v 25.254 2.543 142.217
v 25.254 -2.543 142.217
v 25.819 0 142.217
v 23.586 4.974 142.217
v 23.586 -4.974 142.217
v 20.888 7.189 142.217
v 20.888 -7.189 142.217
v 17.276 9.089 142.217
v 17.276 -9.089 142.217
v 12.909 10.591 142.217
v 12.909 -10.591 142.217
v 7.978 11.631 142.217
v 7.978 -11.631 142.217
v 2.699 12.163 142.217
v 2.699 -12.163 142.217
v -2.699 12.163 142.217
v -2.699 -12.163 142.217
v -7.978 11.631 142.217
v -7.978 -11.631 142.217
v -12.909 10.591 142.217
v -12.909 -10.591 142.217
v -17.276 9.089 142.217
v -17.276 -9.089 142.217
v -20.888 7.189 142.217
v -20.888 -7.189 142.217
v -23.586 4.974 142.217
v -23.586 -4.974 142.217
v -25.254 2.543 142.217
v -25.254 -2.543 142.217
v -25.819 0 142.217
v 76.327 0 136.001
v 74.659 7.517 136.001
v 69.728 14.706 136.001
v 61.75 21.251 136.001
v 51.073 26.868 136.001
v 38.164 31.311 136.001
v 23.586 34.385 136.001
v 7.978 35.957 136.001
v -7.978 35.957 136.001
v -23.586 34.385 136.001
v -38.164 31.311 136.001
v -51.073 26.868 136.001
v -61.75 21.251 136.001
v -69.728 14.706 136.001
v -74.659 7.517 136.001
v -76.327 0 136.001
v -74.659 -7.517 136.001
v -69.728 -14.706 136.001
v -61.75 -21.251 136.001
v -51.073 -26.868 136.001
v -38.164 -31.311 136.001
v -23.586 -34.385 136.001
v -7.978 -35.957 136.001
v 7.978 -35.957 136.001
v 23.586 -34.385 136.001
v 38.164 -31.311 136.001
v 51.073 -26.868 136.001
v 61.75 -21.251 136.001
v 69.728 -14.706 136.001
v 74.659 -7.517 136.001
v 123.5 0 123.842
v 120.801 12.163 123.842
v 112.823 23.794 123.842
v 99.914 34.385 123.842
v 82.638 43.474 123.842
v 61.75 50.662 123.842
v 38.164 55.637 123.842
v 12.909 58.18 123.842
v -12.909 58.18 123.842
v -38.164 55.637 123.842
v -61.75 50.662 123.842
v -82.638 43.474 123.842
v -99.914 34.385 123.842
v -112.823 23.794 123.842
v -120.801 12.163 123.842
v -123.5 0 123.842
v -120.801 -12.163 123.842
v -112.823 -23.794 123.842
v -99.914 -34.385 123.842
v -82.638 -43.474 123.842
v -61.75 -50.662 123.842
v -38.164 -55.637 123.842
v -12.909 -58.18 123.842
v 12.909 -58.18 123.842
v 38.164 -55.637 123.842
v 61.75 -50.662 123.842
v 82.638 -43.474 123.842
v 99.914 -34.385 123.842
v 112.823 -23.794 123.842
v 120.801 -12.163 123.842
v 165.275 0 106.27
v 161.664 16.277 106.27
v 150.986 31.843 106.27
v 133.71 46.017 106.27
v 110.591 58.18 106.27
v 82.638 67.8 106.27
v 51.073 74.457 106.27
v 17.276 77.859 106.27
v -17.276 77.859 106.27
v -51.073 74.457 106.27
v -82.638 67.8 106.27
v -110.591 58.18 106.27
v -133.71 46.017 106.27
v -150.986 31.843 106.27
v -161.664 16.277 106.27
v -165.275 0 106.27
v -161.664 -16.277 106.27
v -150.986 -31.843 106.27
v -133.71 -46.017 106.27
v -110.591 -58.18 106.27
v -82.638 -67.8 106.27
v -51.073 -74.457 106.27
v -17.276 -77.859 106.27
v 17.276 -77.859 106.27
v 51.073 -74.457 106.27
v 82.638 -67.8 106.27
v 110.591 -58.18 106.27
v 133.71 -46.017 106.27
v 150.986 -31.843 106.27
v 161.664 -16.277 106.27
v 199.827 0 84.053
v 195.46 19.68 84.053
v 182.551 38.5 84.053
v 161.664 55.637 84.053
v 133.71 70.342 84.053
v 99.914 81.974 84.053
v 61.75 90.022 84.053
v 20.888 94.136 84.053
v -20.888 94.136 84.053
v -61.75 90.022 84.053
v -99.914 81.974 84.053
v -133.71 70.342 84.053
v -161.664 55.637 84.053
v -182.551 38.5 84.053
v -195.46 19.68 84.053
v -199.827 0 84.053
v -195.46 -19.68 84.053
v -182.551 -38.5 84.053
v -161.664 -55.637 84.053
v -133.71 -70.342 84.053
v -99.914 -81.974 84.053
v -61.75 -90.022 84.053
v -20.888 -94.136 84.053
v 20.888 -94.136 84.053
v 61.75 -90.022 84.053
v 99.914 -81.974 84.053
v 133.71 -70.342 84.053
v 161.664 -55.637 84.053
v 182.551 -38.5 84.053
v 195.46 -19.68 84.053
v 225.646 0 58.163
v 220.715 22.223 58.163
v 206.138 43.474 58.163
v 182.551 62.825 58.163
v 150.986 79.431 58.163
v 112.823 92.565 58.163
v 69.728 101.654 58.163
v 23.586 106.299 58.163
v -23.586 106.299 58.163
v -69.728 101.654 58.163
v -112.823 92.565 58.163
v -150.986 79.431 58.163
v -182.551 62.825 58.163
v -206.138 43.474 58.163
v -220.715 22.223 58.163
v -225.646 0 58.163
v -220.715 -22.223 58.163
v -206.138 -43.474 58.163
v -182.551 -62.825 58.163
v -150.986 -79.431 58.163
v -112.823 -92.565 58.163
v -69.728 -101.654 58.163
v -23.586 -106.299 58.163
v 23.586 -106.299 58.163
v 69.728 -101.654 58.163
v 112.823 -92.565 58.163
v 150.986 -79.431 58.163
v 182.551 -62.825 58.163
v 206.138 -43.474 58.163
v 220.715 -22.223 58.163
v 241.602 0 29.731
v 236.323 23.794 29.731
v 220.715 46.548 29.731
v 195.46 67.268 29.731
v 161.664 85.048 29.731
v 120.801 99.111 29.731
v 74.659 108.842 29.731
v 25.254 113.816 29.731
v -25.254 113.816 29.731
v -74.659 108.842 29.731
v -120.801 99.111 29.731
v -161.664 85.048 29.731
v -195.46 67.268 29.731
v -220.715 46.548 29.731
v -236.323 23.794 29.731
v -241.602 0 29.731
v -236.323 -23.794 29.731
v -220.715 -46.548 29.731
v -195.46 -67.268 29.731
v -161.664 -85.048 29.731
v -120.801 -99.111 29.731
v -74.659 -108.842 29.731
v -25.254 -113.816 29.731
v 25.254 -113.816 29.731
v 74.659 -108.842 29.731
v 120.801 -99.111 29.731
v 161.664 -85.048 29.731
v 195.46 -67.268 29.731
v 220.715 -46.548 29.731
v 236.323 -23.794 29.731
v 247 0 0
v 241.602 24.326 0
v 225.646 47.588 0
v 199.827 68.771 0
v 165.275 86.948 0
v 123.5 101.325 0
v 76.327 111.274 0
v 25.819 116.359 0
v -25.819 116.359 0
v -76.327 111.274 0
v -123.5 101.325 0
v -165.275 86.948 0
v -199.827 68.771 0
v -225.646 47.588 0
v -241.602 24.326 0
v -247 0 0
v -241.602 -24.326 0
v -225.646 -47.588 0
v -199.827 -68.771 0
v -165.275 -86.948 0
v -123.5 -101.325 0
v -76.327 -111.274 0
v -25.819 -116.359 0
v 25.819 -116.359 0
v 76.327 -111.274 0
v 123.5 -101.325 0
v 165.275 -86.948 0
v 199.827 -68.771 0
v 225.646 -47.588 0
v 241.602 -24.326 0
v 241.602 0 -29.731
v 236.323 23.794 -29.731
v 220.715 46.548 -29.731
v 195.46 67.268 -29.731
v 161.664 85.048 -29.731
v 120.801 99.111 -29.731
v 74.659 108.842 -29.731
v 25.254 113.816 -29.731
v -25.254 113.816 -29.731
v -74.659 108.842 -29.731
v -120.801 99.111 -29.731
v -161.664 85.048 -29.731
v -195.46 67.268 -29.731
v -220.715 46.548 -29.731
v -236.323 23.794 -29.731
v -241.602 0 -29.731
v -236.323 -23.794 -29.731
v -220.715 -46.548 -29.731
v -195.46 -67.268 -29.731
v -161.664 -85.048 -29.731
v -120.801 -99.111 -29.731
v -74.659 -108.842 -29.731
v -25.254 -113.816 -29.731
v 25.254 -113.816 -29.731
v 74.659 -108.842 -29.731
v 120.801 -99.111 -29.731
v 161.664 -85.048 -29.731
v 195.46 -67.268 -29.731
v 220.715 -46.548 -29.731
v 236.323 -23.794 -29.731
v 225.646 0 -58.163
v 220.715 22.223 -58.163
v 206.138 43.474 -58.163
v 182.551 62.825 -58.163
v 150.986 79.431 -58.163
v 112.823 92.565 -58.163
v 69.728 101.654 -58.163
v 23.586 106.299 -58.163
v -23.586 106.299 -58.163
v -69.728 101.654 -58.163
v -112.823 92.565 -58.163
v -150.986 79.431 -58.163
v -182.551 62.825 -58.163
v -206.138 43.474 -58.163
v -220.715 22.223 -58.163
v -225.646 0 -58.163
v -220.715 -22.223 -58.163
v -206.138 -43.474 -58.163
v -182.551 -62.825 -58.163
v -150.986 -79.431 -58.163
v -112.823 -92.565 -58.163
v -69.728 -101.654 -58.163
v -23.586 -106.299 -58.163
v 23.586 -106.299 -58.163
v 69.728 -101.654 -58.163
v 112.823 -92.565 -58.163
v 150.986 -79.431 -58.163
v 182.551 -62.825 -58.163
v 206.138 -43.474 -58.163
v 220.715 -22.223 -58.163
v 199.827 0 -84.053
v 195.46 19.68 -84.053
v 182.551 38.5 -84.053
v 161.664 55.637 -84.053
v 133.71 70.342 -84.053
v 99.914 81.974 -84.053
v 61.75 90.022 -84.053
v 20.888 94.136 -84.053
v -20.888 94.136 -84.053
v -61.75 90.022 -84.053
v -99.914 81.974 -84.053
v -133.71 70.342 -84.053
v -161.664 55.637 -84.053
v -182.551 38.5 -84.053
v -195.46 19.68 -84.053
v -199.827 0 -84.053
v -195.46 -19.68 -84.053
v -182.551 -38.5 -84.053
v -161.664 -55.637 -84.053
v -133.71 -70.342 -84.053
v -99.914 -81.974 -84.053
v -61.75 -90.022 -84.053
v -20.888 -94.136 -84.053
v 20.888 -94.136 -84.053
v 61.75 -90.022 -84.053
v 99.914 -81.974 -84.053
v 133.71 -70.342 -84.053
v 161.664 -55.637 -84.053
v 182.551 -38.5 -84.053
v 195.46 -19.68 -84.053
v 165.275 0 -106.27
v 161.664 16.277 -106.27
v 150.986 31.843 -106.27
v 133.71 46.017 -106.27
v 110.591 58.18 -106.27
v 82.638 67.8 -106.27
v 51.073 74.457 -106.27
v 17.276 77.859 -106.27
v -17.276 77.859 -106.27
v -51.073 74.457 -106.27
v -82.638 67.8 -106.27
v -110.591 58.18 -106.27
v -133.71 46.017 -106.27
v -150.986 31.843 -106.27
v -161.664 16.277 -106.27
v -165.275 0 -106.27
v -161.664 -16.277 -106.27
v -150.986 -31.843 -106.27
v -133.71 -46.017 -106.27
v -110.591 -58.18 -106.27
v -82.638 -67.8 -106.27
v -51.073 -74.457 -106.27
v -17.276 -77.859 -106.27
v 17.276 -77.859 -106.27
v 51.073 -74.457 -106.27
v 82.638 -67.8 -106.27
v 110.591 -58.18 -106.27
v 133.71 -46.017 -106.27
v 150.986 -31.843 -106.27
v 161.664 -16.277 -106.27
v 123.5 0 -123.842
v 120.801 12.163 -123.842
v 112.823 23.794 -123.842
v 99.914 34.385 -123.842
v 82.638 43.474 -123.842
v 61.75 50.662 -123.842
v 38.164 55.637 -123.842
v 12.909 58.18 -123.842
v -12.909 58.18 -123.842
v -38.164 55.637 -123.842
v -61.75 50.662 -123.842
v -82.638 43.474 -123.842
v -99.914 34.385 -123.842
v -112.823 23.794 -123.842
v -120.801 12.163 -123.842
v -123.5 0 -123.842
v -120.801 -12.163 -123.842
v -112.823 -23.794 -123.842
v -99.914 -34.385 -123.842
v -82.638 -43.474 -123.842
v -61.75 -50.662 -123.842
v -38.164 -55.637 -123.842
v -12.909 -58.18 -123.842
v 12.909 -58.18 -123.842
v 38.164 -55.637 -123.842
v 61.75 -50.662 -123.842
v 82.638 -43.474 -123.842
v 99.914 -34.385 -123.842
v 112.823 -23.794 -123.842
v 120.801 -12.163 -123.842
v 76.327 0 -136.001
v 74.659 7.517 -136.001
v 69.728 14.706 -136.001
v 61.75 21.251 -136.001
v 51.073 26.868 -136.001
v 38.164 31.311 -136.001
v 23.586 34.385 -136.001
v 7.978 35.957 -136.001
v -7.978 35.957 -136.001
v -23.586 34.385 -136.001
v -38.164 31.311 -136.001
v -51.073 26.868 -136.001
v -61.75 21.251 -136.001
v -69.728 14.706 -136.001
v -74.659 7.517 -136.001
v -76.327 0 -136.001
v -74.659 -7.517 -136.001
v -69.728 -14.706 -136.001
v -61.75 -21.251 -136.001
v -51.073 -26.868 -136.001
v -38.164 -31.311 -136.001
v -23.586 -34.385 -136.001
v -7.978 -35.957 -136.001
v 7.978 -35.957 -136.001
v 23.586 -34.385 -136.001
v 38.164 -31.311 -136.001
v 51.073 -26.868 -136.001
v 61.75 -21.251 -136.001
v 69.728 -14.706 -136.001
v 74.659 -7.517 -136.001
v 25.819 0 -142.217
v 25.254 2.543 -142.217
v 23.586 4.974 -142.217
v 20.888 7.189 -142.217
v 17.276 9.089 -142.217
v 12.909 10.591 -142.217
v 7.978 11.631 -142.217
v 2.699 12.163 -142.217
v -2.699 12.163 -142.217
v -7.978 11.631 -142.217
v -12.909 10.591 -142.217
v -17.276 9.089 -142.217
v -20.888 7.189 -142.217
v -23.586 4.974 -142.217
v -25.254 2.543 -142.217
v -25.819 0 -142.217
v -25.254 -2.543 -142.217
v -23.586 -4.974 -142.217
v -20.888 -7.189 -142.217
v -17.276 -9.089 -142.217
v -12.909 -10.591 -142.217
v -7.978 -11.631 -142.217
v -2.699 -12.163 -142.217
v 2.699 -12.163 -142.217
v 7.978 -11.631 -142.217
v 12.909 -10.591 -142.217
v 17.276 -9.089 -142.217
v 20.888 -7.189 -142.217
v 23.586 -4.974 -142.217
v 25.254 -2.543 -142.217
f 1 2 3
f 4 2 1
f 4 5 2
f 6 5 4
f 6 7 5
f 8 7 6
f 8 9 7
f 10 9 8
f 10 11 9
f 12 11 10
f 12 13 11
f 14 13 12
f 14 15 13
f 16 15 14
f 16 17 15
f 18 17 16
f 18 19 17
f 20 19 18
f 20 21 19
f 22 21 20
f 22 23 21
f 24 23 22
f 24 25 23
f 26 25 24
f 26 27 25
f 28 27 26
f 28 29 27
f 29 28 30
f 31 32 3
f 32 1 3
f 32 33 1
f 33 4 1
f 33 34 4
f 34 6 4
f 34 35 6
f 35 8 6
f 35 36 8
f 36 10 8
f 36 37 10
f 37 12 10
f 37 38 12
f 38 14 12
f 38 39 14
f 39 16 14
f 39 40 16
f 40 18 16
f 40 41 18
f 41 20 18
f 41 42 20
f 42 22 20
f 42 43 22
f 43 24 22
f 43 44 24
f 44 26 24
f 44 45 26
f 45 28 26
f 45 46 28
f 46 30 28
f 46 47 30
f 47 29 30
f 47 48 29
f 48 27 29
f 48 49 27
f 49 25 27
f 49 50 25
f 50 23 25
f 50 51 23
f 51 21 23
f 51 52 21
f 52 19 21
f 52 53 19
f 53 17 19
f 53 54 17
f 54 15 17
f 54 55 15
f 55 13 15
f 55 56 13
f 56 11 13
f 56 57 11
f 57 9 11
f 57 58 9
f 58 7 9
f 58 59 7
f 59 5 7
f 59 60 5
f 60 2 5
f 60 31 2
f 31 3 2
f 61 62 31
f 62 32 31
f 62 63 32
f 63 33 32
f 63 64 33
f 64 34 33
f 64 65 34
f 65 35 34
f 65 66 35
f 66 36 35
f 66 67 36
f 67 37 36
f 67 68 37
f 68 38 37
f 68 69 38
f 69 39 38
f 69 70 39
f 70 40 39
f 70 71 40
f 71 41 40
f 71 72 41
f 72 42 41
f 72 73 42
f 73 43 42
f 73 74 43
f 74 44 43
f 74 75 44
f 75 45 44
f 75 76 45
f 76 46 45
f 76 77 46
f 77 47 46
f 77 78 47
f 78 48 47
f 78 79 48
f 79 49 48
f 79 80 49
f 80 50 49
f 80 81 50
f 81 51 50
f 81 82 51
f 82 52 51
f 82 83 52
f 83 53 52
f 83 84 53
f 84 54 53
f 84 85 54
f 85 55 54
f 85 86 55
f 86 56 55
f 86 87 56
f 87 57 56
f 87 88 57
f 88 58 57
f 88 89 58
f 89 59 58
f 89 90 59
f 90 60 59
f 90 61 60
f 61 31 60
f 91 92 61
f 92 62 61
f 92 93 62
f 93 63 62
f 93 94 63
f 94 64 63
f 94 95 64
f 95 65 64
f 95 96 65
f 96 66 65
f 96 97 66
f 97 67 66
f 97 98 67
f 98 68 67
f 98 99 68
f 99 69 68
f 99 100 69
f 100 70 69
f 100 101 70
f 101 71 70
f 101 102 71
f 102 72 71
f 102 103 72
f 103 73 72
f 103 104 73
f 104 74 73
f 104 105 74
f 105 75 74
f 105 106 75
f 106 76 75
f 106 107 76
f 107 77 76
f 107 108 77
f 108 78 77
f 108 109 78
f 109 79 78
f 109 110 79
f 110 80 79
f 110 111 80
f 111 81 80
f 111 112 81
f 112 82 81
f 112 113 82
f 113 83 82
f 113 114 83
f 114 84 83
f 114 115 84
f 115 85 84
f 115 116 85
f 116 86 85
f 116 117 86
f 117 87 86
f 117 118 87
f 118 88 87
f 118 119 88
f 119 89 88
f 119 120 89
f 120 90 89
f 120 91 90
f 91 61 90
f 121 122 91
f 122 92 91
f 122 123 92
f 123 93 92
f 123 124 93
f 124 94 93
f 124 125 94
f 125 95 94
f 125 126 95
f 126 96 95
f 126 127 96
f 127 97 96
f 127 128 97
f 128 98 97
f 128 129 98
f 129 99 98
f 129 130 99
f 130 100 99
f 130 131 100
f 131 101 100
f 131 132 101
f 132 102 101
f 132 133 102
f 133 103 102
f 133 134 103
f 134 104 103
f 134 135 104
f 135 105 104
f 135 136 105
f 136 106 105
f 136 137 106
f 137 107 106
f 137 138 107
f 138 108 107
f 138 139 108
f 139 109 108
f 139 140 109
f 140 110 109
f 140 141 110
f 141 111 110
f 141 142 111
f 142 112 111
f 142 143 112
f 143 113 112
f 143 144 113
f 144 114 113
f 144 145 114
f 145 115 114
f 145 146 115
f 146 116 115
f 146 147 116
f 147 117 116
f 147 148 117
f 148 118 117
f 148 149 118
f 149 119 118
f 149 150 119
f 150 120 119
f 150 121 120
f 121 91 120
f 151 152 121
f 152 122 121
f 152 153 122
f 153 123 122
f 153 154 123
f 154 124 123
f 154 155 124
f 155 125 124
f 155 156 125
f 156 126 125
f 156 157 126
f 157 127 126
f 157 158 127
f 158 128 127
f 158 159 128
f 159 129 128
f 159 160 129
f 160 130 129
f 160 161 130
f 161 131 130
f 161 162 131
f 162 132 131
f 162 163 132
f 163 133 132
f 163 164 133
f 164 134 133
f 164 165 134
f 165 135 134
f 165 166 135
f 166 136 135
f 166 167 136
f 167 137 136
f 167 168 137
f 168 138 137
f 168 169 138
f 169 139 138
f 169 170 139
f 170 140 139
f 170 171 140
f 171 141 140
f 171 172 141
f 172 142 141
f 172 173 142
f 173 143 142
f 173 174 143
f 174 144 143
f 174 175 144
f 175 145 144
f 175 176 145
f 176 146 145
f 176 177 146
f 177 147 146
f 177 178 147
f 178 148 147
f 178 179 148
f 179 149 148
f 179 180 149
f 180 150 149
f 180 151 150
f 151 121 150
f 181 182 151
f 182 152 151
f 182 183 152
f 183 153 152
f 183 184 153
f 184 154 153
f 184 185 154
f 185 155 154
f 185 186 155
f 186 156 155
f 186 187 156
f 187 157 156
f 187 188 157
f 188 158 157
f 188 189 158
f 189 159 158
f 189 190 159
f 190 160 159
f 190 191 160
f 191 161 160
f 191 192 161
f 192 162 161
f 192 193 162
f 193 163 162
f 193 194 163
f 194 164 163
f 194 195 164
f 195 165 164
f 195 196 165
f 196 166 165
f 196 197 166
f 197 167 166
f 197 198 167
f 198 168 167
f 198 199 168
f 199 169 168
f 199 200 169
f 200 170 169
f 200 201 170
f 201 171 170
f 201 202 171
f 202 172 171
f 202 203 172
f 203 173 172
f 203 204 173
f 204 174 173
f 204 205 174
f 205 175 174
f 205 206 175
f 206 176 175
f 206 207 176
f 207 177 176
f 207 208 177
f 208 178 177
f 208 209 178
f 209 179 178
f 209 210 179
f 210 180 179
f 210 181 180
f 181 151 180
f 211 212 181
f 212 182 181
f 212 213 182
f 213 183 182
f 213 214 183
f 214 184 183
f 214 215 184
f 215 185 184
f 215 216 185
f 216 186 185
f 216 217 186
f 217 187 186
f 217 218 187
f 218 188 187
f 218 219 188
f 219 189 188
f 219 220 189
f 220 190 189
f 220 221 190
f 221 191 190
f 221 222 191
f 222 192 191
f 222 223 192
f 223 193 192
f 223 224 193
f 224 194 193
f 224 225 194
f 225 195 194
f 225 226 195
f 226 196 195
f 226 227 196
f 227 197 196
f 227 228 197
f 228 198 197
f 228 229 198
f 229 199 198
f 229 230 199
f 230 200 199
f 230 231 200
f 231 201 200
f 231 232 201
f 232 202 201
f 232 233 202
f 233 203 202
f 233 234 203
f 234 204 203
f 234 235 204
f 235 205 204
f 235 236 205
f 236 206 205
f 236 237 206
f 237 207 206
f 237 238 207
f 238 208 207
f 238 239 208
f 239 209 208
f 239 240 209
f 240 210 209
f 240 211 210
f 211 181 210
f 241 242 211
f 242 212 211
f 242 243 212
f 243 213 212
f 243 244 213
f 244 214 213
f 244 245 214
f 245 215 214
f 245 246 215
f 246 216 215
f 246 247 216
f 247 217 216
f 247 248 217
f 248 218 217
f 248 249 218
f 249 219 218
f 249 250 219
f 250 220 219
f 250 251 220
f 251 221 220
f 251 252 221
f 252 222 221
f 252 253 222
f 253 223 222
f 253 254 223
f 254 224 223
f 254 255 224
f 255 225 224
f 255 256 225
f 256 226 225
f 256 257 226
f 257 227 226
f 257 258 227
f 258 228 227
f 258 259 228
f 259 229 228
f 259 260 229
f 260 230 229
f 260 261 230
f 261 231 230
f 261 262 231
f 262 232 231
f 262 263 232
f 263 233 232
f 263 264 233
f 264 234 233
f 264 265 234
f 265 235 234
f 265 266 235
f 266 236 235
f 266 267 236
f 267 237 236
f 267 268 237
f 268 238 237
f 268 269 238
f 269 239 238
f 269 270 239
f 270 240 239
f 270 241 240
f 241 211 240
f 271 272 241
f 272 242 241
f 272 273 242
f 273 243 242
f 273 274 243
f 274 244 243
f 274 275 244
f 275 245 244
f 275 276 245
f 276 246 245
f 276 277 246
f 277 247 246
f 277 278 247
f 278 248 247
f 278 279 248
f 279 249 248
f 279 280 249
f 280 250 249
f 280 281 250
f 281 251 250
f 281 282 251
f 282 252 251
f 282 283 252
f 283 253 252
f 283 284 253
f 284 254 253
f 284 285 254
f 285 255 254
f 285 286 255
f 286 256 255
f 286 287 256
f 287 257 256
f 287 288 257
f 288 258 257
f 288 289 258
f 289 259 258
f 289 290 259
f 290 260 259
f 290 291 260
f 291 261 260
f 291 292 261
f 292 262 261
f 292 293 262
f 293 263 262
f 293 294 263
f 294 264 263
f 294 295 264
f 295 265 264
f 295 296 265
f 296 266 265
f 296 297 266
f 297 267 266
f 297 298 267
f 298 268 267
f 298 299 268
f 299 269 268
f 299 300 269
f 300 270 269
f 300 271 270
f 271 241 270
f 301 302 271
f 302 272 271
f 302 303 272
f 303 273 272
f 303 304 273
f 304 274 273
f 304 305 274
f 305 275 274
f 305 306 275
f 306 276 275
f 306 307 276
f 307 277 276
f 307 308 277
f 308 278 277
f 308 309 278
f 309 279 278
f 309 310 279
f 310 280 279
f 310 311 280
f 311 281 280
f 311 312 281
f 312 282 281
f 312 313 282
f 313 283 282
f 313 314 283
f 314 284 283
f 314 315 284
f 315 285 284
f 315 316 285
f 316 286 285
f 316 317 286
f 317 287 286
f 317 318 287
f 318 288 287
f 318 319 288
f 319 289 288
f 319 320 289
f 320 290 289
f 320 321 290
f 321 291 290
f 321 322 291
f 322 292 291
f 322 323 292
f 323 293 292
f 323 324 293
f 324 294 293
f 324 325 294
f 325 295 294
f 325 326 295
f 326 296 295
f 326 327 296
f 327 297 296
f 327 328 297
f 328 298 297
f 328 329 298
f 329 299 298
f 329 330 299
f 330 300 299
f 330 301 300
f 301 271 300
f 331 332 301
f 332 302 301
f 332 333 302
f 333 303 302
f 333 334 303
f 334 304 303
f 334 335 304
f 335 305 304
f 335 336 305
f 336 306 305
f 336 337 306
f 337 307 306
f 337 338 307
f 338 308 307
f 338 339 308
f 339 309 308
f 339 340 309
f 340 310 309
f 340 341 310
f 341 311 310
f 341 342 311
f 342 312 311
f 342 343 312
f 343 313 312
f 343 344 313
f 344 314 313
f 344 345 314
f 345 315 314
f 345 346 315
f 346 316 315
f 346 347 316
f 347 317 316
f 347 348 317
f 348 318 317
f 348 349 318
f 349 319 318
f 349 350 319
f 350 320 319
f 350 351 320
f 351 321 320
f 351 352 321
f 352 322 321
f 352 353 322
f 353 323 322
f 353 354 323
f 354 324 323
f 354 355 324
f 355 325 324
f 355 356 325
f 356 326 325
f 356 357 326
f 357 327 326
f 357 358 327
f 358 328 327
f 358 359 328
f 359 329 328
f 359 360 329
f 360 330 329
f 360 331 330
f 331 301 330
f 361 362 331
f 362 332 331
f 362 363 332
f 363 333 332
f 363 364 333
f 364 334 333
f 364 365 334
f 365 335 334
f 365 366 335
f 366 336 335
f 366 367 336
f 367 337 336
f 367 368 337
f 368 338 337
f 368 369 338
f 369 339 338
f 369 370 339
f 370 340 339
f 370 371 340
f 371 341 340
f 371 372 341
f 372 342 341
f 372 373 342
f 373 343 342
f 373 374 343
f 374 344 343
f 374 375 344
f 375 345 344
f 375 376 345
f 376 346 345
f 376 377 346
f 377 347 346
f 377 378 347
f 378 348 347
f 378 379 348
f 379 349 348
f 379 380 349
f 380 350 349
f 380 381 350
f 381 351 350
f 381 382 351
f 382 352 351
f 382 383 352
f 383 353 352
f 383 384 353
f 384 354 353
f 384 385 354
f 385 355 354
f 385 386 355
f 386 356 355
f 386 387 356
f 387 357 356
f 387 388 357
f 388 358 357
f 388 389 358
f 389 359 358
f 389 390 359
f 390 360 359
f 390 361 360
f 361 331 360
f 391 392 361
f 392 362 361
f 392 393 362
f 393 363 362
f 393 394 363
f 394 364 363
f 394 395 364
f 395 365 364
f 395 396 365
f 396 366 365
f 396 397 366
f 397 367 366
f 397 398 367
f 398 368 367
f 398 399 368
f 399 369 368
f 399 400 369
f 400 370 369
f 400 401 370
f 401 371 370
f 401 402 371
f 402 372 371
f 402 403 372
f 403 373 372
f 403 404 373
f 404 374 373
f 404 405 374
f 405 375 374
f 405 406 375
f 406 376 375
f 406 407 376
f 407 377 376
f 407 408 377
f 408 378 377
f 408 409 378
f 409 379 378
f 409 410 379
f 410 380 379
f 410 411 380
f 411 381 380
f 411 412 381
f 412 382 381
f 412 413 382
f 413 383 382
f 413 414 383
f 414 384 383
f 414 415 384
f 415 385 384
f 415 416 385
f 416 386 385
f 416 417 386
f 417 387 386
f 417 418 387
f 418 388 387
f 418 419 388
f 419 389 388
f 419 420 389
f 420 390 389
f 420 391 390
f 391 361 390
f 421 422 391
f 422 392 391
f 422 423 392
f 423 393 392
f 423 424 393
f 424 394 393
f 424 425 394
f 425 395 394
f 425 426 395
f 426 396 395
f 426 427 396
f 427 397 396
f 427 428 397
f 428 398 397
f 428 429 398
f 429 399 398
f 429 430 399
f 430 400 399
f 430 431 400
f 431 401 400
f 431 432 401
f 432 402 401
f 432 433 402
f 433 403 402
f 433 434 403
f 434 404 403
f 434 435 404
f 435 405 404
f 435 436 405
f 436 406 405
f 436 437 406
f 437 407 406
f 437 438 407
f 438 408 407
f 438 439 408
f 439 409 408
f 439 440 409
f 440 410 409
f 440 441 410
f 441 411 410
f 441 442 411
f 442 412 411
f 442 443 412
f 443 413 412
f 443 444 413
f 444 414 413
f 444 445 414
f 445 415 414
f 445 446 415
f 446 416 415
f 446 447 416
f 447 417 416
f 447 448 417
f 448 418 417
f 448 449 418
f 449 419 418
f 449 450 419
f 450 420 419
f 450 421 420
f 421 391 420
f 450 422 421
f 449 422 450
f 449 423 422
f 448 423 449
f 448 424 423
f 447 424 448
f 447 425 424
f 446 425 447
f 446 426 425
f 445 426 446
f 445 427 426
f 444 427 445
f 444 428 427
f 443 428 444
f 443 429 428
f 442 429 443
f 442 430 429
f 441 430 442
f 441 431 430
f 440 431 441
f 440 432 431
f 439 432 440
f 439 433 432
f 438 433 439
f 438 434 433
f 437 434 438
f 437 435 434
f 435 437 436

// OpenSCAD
// Generated by SolidPython 1.0.1 on 2020-07-29 00:46:54


scale(v = [19, 9, 11]) {
	sphere(r = 13);
}
/***********************************************
*********      SolidPython code:      **********
************************************************
 
# import packages: SolidPython
from solid import *
from solid.utils import *
from itertools import chain, combinations, permutations


class Resize:

    def __init__(self, scad_file):
        self.scad_file = scad_file
        #self.scad_file = import_scad(scad_file)
        # cone/cylinder param:
        self.r1 = 0
        self.r2 = 0
        self.h = 0
        # rectangular prism param:
        self.w = 0
        self.l = 0
        # ellipse param:
        self.r = 0

    # import OpenScad code (file name corresponds to shape)


    # classify shape + parameters
    def assign(self, param1, param2, param3):
        if self.scad_file == 'cone.scad':
            self.r1 = param1
            self.r2 = param2
            self.h = param3
        elif self.scad_file == 'cylinder.scad':
            self.r1 = param1
            self.r2 = param2
            self.h = param3
        elif self.scad_file == 'rectangularPrism.scad':
            self.h = param1
            self.l = param2
            self.w = param3
        else:
            self.r = param1
            self.h = param2

    # resize parameters
    def iterate(self):
        x = range(3, 20, 2)
        i = 1
        if self.scad_file == 'cone.scad':
            tempList = list(permutations(x, 2))
            for temp in tempList:
                param1 = temp[0]
                param2 = temp[1]
                filepath = 'produced_scad_files/' + 'cone' + str(param1) + '_' + str(param2) + '_' + '.scad'
                scad_render_to_file(cylinder(h=param1, r1=param2, r2=0), filepath)

        elif self.scad_file == 'cylinder.scad':
            tempList = list(permutations(x, 3))
            for temp in tempList:
                param1 = temp[0]
                param2 = temp[1]
                filepath = 'produced_scad_files/' + 'cylinder' + str(param1) + '_' + str(param2) + '_' + '.scad'
                scad_render_to_file(cylinder(h=param1, r1=param2, r2=param2), filepath)

        elif self.scad_file == 'rectangularPrism.scad':
            tempList = list(permutations(x, 3))
            for temp in tempList:
                param1 = temp[0]
                param2 = temp[1]
                param3 = temp[2]
                filepath = 'produced_scad_files/' + 'rectangularPrism' + str(param1) + '_' + str(param2) + '_' + str(
                    param3) + '.scad'
                scad_render_to_file(cube(size=(param1, param2, param3)), filepath)

        elif self.scad_file == 'ellipse.scad':
            tempList = list(permutations(x, 4))
            for temp in tempList:
                param1 = temp[0]
                param2 = temp[1]
                param3 = temp[2]
                param4 = temp[3]
                filepath = 'produced_scad_files/' + 'ellipse' + str(param1) + '_' + str(param2) + '_' + str(param3) + '_' + str(param4) + '.scad'
                scad_render_to_file(scale([param1, param2, param3])(sphere(r=param4)), filepath)

    def render_to_scadfile(self):
        scad_render_to_file(scad, 'example.scad') 
 
************************************************/
